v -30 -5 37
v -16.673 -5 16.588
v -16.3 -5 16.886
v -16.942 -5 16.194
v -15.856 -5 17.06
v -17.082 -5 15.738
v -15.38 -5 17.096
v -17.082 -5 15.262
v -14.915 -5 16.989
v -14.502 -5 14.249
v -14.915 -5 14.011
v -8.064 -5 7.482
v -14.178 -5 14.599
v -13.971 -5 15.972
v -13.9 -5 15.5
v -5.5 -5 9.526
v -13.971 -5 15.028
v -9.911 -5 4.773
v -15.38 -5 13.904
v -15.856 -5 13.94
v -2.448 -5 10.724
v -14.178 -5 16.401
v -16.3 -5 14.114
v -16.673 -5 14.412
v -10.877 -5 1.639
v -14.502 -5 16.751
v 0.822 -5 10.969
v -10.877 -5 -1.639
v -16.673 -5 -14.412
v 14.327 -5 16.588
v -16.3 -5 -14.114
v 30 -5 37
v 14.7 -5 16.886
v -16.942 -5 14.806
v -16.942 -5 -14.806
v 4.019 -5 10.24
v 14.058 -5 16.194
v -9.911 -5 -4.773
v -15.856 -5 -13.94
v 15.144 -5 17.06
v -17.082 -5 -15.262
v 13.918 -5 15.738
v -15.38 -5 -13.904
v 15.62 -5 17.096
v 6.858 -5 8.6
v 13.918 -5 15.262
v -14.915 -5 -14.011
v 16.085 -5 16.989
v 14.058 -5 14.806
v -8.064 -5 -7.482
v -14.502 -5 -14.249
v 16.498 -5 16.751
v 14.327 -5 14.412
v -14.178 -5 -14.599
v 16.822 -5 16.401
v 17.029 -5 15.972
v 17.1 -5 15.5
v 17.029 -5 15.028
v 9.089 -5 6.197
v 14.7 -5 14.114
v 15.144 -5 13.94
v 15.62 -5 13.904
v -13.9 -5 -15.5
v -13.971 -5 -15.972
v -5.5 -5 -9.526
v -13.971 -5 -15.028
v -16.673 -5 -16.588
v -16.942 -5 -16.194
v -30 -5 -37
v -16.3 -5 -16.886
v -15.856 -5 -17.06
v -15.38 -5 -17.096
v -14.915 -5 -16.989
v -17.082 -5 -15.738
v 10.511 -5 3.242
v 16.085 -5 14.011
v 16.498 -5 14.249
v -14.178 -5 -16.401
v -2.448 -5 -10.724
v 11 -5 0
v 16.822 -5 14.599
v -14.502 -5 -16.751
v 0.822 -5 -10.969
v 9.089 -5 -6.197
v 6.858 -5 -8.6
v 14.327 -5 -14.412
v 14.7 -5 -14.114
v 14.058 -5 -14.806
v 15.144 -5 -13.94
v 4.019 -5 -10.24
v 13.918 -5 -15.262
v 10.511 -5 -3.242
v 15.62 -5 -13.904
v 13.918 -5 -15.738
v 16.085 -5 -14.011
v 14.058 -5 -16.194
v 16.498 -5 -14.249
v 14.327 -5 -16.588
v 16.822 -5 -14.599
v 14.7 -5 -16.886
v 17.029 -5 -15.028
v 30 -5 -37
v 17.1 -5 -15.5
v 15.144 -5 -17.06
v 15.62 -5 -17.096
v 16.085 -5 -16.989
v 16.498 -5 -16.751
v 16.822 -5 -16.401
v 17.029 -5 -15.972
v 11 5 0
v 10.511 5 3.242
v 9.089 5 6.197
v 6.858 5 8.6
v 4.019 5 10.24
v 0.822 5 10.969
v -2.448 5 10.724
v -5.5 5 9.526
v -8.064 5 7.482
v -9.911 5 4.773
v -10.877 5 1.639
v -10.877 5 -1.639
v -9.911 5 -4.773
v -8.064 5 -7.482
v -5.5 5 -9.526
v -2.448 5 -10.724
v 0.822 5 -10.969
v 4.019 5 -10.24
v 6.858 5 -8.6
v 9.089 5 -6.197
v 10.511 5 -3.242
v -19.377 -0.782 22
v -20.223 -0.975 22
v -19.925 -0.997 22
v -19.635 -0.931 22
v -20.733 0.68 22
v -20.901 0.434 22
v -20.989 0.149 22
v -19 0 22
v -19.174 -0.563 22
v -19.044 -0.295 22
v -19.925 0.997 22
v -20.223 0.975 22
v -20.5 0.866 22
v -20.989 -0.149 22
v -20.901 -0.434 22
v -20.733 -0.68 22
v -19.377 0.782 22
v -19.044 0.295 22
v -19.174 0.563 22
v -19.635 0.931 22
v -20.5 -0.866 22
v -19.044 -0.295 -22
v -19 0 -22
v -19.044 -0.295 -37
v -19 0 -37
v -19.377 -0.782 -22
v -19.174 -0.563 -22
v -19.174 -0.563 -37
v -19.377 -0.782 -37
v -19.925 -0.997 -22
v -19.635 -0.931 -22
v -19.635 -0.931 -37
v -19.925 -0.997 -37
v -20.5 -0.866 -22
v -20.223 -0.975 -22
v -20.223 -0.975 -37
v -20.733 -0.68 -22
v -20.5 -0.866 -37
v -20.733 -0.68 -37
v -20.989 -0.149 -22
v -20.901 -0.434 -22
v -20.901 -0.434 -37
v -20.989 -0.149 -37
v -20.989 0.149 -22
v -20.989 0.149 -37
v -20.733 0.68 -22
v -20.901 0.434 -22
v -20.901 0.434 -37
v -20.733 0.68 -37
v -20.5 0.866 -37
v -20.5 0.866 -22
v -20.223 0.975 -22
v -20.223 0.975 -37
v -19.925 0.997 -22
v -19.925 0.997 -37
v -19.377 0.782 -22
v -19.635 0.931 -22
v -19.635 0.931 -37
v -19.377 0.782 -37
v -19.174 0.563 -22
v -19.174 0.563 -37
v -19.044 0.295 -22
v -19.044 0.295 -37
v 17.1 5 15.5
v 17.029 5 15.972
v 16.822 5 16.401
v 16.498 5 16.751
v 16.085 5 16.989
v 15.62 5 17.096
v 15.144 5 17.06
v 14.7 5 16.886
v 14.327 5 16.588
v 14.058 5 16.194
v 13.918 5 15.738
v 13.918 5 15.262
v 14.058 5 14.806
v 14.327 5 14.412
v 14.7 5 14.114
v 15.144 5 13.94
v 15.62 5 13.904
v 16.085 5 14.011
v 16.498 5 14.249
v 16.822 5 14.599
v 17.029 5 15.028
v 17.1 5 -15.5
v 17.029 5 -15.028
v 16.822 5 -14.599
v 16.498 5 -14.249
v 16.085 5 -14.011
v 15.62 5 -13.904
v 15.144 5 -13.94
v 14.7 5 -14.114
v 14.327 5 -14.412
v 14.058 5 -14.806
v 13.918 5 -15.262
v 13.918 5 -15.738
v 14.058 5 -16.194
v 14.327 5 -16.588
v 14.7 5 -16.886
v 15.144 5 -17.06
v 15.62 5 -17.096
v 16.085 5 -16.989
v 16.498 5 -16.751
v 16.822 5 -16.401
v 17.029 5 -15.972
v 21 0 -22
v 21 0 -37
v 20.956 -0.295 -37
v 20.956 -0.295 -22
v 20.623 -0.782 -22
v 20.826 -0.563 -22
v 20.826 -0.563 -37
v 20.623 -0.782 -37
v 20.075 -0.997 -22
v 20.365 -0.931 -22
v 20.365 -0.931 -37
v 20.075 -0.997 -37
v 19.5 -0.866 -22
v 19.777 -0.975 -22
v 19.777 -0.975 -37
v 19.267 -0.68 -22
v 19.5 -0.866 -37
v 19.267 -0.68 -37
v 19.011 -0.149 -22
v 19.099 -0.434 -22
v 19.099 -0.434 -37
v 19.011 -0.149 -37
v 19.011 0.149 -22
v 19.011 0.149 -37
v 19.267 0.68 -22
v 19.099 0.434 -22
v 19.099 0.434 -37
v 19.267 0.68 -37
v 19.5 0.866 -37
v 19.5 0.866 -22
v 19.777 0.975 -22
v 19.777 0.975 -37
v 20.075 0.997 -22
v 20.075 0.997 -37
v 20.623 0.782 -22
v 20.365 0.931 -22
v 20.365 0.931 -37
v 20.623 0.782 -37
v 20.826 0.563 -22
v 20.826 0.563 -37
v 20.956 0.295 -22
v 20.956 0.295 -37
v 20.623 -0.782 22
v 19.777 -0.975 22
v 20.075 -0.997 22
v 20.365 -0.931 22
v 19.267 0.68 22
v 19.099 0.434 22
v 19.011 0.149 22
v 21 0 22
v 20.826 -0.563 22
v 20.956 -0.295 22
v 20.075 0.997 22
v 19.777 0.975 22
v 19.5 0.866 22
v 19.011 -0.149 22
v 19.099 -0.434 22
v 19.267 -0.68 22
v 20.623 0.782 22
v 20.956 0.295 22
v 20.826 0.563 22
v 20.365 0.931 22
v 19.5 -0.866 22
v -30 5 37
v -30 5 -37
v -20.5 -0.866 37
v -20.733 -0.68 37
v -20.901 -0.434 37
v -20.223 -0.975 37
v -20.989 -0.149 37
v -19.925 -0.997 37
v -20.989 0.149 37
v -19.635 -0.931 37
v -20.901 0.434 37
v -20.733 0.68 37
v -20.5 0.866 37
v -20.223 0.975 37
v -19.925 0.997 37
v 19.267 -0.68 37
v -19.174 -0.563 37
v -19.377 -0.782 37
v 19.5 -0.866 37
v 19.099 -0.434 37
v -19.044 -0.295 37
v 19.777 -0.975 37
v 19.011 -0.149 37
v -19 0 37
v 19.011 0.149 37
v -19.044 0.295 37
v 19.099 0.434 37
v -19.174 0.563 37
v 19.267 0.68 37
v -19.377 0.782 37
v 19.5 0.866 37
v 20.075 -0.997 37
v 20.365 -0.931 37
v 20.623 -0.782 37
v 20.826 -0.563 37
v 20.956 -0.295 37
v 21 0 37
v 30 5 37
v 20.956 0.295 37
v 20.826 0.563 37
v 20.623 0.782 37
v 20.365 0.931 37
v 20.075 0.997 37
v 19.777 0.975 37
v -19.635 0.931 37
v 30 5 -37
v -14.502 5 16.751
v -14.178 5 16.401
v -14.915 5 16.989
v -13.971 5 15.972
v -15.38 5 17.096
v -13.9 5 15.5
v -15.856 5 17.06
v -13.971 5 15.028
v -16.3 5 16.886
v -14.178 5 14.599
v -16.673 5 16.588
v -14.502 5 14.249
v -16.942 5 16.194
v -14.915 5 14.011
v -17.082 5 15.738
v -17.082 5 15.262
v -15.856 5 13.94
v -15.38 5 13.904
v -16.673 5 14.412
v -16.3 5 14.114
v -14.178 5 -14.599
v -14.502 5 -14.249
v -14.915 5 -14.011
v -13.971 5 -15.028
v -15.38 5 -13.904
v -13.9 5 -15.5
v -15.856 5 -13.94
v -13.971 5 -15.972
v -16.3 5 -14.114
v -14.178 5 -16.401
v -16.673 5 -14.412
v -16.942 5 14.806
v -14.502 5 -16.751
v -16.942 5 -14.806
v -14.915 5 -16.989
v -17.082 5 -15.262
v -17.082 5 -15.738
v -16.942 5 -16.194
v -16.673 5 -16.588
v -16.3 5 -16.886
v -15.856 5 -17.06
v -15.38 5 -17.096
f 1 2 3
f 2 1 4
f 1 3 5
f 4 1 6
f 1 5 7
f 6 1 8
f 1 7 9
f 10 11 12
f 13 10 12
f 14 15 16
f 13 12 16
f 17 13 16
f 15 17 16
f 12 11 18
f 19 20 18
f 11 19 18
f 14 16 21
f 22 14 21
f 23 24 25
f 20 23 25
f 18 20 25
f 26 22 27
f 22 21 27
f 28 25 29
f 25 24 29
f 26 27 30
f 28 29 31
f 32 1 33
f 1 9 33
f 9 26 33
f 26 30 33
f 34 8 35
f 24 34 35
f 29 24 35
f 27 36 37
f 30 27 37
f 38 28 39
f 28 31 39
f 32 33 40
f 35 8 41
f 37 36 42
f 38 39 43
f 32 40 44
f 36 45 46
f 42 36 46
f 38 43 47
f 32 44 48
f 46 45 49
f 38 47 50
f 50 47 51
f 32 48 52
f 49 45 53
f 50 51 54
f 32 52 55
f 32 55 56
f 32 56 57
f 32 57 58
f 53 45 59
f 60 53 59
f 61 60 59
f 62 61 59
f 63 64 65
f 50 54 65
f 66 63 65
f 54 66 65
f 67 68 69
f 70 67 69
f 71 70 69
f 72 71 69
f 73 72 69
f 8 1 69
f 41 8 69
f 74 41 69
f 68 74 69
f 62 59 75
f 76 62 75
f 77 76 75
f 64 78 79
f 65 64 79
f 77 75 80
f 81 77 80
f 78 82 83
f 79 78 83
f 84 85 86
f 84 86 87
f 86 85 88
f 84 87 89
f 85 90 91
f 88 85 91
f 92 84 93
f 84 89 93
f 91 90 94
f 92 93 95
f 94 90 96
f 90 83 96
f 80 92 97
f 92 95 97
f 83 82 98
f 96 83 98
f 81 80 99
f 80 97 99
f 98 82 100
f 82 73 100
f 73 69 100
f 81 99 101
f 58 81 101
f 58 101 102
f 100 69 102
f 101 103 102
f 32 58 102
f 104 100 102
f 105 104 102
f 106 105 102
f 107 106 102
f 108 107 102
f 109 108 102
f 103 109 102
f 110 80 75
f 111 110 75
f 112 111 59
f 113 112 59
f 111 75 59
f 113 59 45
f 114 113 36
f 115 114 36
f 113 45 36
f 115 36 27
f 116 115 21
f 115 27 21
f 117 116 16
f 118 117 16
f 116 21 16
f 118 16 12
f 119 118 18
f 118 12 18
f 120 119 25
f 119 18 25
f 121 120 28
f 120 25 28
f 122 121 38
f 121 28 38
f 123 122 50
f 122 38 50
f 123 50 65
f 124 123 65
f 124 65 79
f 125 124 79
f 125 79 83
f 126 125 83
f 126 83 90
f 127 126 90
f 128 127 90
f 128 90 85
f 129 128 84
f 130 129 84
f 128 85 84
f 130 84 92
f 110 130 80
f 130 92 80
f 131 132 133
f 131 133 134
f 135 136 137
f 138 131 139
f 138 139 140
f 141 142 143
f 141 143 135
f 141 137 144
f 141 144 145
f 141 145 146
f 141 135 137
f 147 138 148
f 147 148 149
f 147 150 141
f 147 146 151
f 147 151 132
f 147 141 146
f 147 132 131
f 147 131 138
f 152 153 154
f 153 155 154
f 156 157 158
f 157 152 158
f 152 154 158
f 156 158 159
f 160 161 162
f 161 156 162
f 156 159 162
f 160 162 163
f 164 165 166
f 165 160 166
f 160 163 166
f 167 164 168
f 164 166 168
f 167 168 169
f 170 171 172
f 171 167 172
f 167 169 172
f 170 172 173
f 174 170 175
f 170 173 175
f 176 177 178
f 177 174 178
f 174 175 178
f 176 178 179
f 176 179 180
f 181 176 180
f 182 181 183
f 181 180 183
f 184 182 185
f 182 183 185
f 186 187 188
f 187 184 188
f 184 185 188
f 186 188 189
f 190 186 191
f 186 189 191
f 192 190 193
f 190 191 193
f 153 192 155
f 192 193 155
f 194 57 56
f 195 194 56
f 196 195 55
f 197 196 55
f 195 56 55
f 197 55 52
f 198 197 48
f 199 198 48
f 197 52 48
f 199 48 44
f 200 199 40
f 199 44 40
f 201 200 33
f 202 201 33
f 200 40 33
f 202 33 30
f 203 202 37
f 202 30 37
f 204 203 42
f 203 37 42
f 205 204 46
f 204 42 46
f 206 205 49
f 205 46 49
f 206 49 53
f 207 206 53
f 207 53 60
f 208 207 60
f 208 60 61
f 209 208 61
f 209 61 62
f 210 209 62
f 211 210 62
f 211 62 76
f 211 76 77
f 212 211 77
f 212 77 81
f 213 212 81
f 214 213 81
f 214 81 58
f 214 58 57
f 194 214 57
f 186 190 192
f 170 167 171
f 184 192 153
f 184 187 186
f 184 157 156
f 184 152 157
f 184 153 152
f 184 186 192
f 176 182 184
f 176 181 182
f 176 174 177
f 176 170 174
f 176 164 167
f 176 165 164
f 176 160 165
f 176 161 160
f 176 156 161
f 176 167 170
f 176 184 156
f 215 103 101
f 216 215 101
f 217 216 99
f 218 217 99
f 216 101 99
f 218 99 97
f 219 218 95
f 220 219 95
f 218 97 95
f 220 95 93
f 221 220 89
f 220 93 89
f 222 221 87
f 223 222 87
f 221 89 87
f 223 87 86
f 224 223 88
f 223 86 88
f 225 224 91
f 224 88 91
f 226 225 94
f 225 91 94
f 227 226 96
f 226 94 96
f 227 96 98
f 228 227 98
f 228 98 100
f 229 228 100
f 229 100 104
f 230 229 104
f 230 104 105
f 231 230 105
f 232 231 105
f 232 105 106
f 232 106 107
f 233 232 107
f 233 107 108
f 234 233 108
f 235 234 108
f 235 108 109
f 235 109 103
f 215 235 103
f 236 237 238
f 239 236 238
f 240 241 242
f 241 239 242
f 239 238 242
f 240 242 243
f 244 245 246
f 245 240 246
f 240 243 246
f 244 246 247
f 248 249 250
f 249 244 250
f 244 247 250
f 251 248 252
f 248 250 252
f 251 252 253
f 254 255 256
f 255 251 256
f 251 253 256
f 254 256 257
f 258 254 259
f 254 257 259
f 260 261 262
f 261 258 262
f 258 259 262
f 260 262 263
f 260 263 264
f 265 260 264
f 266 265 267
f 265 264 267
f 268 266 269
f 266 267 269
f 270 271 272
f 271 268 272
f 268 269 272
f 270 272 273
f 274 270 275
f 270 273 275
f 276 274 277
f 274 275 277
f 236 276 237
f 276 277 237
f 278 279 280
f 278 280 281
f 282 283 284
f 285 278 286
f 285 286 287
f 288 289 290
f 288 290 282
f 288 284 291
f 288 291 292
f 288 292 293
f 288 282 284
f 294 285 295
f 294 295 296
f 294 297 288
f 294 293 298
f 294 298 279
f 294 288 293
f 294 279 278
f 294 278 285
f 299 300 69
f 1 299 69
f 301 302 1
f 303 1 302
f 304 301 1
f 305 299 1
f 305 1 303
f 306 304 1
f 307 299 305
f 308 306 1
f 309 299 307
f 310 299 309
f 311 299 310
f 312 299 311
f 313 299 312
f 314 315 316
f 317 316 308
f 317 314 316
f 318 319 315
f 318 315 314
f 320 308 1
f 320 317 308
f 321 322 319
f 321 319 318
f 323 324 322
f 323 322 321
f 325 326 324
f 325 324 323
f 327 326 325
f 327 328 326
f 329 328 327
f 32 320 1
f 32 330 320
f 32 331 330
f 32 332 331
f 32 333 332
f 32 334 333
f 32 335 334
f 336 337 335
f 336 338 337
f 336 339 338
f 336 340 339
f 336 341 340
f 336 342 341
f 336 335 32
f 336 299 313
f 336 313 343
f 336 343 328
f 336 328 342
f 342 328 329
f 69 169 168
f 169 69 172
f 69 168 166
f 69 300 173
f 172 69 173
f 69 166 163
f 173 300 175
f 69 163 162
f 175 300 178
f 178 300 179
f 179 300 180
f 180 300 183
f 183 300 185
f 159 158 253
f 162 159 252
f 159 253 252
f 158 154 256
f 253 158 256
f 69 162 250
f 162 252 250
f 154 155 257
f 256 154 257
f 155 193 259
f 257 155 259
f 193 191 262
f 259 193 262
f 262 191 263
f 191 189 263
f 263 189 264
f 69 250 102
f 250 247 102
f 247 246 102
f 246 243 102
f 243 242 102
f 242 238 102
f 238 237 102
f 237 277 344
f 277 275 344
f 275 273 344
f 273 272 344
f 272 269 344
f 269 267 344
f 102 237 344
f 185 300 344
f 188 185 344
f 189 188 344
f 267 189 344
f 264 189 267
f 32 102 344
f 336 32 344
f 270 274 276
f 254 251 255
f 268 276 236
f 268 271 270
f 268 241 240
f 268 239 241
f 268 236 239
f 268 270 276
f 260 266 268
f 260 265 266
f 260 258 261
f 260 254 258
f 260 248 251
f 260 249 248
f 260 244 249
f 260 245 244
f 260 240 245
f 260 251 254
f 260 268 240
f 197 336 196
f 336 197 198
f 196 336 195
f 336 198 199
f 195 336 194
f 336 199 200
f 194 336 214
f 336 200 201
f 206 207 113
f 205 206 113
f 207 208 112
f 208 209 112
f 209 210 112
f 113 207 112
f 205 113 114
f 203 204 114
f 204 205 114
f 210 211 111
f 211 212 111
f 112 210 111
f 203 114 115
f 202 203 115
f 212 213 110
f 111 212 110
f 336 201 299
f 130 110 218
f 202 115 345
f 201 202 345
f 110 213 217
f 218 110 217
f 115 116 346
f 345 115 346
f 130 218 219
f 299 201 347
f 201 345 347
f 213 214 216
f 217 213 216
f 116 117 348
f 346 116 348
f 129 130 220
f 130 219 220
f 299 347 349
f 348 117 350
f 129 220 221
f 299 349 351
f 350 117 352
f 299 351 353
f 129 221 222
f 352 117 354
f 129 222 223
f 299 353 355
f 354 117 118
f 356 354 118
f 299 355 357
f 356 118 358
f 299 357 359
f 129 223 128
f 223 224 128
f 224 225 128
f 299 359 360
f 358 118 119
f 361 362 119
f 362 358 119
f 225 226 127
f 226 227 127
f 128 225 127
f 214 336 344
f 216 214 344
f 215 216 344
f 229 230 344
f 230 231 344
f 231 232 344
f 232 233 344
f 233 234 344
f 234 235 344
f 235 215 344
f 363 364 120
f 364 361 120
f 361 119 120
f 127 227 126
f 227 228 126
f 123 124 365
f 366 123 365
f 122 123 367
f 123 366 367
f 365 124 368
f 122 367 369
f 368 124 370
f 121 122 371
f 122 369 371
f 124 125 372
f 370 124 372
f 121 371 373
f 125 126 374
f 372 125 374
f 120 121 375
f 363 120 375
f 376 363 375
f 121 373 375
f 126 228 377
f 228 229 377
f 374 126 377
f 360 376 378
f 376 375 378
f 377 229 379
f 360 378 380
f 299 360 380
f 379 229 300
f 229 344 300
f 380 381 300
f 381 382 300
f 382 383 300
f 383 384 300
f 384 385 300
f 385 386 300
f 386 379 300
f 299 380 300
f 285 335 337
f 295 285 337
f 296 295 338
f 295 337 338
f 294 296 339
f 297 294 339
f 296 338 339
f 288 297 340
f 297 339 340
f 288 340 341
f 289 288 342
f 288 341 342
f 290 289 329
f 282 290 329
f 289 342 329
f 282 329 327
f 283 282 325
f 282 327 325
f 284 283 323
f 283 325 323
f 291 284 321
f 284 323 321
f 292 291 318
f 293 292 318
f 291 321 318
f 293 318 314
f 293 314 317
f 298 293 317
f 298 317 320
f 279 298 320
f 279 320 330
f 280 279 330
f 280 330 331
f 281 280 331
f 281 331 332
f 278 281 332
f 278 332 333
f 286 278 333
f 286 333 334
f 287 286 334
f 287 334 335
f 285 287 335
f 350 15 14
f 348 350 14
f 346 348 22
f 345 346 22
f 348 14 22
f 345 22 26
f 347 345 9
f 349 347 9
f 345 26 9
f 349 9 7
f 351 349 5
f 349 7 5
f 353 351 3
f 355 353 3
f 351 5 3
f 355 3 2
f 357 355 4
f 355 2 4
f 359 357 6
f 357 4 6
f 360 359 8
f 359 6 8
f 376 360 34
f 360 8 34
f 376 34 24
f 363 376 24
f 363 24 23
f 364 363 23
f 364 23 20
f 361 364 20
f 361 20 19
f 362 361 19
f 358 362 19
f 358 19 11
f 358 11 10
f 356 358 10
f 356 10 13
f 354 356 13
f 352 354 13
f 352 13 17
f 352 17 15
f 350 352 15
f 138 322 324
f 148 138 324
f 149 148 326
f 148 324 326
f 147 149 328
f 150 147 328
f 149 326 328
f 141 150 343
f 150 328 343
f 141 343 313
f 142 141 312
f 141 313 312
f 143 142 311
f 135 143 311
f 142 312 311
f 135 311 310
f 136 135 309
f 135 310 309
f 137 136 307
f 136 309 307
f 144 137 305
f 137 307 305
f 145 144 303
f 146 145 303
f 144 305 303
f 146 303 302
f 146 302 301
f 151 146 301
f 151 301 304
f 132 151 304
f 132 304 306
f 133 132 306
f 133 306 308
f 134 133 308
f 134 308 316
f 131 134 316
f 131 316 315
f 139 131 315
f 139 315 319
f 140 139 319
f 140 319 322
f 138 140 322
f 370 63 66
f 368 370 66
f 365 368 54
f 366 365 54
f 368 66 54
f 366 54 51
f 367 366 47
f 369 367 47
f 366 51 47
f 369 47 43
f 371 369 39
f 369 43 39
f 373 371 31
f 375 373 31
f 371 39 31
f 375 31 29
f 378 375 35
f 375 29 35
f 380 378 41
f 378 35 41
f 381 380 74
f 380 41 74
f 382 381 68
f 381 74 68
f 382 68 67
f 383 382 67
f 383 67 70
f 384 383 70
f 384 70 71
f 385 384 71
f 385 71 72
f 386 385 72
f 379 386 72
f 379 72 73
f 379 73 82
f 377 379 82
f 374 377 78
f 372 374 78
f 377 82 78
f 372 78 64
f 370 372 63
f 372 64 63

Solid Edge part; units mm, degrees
sketch "Sketch1" plane through (0, 0, 0) normal (0, 0, 1) x (1, 0, 0)
  line L0 (-30, -5) -> (30, -5)
  line L1 (30, -5) -> (30, 5)
  line L2 (30, 5) -> (-30, 5)
  line L3 (-30, 5) -> (-30, -5)
  dimension "D1" = 60
  dimension "D2" = 10
extrude "Protrusion1" add sketch "Sketch1" along normal mid plane 74
sketch "Sketch2" plane through (0, 0, 37) normal (0, 0, 1) x (1, 0, 0)
  circle A0 centre (-20, 0) radius 1
  circle A1 centre (20, 0) radius 1
  dimension "D1" = 2
  dimension "D2" = 40
extrude "Extrusionsausschnitt_1" cut sketch "Sketch2" against normal blind 15
mirror "Mirror1" about plane through (0, 0, 0) normal (0, 0, 1) of "Extrusionsausschnitt_1"
sketch "Sketch3" plane through (0, -5, 0) normal (0, -1, 0) x (1, 0, 0)
  circle A0 centre (0, 0) radius 11
  circle A1 centre (-15.5, 15.5) radius 1.6
  circle A2 centre (-15.5, -15.5) radius 1.6
  circle A3 centre (15.5, -15.5) radius 1.6
  circle A4 centre (15.5, 15.5) radius 1.6
  dimension "D1" = 22
  dimension "D2" = 31
extrude "Cutout1" cut sketch "Sketch3" against normal through all
properties material "Nylon, allgemein"
